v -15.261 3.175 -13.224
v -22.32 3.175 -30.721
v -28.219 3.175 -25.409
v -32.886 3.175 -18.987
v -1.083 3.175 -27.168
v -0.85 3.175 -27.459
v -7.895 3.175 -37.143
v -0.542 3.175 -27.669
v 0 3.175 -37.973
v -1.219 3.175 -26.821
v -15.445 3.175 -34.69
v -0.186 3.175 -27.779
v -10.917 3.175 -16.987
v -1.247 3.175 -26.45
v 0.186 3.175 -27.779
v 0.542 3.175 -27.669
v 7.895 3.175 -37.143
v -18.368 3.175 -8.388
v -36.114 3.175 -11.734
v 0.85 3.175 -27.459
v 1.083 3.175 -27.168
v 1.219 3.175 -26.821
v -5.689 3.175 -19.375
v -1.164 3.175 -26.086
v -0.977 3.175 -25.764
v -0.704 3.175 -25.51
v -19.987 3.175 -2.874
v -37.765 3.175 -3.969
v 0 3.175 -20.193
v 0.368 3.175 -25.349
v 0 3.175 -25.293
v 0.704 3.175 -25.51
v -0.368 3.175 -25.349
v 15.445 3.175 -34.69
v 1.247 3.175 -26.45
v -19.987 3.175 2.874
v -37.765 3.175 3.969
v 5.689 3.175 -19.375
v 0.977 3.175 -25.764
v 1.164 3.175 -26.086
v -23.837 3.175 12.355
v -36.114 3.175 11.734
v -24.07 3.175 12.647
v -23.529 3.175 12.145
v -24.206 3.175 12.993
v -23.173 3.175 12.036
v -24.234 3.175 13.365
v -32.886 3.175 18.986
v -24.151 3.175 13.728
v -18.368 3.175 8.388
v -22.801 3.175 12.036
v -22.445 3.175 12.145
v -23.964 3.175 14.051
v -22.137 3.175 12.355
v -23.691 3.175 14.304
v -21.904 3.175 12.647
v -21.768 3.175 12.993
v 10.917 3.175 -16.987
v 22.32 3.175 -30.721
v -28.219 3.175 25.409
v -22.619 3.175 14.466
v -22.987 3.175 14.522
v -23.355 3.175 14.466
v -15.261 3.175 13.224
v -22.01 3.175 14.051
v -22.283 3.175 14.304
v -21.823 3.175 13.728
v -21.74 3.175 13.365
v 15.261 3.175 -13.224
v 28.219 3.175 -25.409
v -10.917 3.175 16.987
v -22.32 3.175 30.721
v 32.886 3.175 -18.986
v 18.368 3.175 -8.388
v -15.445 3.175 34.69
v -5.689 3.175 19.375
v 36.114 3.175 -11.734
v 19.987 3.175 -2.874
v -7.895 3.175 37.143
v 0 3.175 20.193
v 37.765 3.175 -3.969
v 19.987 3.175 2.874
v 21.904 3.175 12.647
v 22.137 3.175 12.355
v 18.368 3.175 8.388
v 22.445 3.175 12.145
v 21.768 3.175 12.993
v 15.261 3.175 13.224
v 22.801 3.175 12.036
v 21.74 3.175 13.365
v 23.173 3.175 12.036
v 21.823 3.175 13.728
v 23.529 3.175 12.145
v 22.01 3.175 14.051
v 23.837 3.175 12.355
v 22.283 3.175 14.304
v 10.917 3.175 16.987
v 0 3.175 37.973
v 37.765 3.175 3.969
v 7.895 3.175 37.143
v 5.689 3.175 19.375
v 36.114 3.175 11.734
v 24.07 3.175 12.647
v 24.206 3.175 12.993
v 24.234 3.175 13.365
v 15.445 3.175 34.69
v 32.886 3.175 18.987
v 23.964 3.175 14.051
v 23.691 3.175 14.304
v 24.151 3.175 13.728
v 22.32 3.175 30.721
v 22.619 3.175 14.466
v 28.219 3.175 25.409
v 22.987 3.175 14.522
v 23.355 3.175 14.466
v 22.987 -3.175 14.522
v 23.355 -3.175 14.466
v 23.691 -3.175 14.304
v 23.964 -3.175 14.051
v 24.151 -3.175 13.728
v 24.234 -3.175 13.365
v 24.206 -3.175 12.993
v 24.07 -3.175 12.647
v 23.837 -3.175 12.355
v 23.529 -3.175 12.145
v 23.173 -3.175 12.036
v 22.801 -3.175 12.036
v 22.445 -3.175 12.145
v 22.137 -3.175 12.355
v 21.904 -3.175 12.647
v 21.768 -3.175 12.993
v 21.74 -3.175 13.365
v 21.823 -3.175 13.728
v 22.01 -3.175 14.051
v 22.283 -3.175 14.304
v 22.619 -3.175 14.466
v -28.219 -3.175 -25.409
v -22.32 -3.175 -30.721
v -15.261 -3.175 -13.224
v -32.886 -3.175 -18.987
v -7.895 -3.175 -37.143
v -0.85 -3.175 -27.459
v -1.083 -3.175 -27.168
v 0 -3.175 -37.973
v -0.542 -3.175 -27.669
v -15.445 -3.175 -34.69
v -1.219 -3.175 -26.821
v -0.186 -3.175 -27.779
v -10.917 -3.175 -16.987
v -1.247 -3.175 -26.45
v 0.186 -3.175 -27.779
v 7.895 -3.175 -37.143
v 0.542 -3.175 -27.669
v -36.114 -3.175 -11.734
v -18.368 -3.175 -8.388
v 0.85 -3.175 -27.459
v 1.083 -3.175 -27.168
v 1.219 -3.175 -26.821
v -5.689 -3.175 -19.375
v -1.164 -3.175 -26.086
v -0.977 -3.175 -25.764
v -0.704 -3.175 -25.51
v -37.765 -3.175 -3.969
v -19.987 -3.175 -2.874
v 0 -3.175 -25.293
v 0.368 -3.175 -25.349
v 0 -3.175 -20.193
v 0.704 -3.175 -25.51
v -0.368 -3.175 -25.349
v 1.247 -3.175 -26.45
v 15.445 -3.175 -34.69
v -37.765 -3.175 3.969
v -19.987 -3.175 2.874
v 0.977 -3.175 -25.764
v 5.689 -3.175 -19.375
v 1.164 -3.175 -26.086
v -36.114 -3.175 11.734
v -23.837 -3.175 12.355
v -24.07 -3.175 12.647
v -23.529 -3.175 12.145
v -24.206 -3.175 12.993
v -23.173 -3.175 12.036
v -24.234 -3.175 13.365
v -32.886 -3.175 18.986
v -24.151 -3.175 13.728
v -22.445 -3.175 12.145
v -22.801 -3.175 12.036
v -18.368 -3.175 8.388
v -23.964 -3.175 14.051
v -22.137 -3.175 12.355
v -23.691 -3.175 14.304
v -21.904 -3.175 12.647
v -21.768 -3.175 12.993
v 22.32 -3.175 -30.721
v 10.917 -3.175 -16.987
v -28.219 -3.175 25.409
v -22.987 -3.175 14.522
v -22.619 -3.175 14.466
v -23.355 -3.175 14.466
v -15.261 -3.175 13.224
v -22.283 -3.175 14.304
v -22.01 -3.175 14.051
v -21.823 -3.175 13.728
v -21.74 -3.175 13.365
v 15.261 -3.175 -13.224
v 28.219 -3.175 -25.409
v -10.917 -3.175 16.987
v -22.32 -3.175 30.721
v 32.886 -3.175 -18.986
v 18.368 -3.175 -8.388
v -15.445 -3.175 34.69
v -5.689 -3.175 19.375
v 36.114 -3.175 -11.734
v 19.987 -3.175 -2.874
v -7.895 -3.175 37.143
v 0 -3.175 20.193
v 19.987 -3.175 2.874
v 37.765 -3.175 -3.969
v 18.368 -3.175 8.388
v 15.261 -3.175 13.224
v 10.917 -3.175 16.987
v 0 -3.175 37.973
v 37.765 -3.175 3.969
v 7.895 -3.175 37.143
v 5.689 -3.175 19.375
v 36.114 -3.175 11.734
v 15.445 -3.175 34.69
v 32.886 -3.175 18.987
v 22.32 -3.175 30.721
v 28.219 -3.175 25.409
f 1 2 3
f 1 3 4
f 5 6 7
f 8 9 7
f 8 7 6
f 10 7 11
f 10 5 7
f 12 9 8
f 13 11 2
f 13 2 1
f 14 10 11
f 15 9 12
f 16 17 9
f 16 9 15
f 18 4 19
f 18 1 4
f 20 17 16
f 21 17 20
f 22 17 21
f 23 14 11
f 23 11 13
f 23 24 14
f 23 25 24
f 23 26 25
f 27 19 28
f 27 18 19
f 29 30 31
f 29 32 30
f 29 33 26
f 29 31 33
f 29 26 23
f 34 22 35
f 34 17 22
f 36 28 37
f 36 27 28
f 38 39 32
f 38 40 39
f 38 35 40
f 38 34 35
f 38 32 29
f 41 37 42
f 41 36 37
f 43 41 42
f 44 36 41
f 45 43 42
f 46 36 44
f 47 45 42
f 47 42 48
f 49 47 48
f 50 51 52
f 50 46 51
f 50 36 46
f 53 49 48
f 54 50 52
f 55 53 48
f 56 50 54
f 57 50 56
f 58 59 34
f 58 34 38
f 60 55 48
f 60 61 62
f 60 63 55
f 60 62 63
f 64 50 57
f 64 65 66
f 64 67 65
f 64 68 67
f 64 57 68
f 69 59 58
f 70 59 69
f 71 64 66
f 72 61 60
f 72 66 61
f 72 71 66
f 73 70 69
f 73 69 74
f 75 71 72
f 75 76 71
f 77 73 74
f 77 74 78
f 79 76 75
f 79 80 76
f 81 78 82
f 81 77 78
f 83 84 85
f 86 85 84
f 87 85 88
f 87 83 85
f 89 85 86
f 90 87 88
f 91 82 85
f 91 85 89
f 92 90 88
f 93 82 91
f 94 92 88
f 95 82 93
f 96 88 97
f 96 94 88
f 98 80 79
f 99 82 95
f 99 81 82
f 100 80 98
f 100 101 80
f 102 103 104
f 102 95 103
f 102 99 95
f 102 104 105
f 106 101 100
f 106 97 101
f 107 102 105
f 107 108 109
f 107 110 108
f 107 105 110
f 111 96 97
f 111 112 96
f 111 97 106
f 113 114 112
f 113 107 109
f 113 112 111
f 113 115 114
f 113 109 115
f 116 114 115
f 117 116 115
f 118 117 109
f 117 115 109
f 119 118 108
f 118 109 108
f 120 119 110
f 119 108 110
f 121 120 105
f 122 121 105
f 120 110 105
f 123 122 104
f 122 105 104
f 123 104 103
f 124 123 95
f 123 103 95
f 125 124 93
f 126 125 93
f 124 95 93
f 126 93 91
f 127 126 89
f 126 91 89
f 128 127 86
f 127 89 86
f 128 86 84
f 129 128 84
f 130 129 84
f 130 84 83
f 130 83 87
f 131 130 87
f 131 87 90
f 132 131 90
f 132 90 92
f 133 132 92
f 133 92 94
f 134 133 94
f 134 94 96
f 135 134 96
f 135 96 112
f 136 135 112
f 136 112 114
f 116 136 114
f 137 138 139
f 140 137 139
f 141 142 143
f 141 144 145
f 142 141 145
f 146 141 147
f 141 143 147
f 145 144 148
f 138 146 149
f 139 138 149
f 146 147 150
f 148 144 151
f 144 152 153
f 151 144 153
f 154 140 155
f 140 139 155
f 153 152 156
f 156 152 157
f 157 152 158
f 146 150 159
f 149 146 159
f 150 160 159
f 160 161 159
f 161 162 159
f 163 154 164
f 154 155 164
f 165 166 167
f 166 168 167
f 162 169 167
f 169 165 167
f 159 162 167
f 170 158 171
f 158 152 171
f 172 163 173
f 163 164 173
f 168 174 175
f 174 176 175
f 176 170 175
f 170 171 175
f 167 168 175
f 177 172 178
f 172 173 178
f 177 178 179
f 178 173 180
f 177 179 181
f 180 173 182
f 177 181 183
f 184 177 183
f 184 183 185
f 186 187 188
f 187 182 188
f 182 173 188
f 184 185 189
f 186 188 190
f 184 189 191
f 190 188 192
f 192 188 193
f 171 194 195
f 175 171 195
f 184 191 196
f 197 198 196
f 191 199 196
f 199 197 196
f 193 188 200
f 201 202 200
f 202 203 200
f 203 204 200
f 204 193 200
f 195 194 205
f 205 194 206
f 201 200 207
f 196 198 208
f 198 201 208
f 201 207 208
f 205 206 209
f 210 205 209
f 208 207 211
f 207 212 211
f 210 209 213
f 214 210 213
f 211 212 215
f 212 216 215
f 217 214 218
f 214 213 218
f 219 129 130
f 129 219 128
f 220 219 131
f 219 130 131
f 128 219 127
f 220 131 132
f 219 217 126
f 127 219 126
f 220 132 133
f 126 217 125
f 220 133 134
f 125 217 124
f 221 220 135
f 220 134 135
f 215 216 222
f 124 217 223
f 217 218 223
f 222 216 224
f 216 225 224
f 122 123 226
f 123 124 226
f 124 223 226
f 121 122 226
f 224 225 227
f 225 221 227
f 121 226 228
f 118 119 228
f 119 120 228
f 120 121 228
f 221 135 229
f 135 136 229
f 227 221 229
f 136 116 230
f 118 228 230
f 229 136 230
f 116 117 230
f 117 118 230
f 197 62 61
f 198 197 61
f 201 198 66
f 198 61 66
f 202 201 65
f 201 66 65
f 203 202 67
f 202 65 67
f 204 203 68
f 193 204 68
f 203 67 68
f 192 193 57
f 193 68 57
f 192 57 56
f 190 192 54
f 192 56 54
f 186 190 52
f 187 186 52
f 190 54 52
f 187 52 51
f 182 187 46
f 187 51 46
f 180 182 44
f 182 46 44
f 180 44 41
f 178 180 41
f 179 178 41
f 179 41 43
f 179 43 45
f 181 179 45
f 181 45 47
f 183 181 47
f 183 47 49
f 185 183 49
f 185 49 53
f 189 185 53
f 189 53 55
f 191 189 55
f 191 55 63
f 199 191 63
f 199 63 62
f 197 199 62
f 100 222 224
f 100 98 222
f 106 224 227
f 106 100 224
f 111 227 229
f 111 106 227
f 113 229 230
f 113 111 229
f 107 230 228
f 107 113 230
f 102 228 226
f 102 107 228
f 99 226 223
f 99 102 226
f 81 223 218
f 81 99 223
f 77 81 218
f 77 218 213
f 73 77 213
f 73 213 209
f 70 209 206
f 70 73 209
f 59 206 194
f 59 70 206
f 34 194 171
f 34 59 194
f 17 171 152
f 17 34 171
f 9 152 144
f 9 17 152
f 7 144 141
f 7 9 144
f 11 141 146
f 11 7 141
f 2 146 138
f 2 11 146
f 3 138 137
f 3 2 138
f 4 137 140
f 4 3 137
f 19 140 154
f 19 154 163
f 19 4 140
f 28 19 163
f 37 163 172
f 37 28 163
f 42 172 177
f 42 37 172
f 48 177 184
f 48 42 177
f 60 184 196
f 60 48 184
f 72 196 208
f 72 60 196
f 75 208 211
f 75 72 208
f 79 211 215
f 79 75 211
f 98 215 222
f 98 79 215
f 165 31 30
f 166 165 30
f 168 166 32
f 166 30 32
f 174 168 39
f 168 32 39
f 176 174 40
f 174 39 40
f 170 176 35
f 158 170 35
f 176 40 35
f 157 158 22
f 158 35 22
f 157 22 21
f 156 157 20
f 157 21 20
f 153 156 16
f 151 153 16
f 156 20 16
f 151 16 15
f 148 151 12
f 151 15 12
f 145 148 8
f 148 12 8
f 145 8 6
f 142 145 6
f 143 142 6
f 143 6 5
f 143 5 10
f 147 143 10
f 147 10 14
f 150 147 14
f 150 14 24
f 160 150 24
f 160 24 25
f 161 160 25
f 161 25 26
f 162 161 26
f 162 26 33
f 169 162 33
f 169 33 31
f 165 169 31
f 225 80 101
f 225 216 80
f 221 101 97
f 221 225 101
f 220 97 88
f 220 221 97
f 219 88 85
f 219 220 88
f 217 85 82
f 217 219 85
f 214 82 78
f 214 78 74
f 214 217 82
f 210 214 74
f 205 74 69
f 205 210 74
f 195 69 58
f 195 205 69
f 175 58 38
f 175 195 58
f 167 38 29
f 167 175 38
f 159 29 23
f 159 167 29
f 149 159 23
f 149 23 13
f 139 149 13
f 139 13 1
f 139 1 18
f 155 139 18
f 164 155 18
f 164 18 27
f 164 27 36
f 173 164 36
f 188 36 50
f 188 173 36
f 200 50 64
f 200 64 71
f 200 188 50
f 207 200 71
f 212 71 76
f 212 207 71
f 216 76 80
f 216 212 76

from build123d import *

# Parameters (mm, degrees)
SKETCH2_R           = 37.973
SKETCH2_R_2         = 20.193
BOSS_EXTRUDE1_DEPTH = 3.175
SKETCH4_R           = 1.25
CUT_EXTRUDE1_DEPTH  = 55.07605716


with BuildPart() as part:
    # Sketch2 → Boss-Extrude1 (new, symmetric)
    with BuildSketch(Plane(origin=(0, 0, 0), x_dir=(1, 0, 0), z_dir=(0, 1, 0))):
        with Locations(Location((0, 0, 0), (0, 0, 270))):
            Circle(SKETCH2_R)
        with Locations(Location((0, 0, 0), (0, 0, 270))):
            Circle(SKETCH2_R_2, mode=Mode.SUBTRACT)
    extrude(amount=BOSS_EXTRUDE1_DEPTH, both=True)

    # Sketch4 → Cut-Extrude1 (cut, through all)
    with BuildSketch(Plane(origin=(0, 3.175, 0), x_dir=(1, 0, 0), z_dir=(0, 1, 0))):
        with Locations(Location((-22.987, -13.271550638, 0), (0, 0, 270))):
            Circle(SKETCH4_R)
        with Locations(Location((0, 26.543101276, 0), (0, 0, 270))):
            Circle(SKETCH4_R)
        with Locations(Location((22.987, -13.271550638, 0), (0, 0, 270))):
            Circle(SKETCH4_R)
    extrude(amount=-CUT_EXTRUDE1_DEPTH, mode=Mode.SUBTRACT)


solid = part.part
